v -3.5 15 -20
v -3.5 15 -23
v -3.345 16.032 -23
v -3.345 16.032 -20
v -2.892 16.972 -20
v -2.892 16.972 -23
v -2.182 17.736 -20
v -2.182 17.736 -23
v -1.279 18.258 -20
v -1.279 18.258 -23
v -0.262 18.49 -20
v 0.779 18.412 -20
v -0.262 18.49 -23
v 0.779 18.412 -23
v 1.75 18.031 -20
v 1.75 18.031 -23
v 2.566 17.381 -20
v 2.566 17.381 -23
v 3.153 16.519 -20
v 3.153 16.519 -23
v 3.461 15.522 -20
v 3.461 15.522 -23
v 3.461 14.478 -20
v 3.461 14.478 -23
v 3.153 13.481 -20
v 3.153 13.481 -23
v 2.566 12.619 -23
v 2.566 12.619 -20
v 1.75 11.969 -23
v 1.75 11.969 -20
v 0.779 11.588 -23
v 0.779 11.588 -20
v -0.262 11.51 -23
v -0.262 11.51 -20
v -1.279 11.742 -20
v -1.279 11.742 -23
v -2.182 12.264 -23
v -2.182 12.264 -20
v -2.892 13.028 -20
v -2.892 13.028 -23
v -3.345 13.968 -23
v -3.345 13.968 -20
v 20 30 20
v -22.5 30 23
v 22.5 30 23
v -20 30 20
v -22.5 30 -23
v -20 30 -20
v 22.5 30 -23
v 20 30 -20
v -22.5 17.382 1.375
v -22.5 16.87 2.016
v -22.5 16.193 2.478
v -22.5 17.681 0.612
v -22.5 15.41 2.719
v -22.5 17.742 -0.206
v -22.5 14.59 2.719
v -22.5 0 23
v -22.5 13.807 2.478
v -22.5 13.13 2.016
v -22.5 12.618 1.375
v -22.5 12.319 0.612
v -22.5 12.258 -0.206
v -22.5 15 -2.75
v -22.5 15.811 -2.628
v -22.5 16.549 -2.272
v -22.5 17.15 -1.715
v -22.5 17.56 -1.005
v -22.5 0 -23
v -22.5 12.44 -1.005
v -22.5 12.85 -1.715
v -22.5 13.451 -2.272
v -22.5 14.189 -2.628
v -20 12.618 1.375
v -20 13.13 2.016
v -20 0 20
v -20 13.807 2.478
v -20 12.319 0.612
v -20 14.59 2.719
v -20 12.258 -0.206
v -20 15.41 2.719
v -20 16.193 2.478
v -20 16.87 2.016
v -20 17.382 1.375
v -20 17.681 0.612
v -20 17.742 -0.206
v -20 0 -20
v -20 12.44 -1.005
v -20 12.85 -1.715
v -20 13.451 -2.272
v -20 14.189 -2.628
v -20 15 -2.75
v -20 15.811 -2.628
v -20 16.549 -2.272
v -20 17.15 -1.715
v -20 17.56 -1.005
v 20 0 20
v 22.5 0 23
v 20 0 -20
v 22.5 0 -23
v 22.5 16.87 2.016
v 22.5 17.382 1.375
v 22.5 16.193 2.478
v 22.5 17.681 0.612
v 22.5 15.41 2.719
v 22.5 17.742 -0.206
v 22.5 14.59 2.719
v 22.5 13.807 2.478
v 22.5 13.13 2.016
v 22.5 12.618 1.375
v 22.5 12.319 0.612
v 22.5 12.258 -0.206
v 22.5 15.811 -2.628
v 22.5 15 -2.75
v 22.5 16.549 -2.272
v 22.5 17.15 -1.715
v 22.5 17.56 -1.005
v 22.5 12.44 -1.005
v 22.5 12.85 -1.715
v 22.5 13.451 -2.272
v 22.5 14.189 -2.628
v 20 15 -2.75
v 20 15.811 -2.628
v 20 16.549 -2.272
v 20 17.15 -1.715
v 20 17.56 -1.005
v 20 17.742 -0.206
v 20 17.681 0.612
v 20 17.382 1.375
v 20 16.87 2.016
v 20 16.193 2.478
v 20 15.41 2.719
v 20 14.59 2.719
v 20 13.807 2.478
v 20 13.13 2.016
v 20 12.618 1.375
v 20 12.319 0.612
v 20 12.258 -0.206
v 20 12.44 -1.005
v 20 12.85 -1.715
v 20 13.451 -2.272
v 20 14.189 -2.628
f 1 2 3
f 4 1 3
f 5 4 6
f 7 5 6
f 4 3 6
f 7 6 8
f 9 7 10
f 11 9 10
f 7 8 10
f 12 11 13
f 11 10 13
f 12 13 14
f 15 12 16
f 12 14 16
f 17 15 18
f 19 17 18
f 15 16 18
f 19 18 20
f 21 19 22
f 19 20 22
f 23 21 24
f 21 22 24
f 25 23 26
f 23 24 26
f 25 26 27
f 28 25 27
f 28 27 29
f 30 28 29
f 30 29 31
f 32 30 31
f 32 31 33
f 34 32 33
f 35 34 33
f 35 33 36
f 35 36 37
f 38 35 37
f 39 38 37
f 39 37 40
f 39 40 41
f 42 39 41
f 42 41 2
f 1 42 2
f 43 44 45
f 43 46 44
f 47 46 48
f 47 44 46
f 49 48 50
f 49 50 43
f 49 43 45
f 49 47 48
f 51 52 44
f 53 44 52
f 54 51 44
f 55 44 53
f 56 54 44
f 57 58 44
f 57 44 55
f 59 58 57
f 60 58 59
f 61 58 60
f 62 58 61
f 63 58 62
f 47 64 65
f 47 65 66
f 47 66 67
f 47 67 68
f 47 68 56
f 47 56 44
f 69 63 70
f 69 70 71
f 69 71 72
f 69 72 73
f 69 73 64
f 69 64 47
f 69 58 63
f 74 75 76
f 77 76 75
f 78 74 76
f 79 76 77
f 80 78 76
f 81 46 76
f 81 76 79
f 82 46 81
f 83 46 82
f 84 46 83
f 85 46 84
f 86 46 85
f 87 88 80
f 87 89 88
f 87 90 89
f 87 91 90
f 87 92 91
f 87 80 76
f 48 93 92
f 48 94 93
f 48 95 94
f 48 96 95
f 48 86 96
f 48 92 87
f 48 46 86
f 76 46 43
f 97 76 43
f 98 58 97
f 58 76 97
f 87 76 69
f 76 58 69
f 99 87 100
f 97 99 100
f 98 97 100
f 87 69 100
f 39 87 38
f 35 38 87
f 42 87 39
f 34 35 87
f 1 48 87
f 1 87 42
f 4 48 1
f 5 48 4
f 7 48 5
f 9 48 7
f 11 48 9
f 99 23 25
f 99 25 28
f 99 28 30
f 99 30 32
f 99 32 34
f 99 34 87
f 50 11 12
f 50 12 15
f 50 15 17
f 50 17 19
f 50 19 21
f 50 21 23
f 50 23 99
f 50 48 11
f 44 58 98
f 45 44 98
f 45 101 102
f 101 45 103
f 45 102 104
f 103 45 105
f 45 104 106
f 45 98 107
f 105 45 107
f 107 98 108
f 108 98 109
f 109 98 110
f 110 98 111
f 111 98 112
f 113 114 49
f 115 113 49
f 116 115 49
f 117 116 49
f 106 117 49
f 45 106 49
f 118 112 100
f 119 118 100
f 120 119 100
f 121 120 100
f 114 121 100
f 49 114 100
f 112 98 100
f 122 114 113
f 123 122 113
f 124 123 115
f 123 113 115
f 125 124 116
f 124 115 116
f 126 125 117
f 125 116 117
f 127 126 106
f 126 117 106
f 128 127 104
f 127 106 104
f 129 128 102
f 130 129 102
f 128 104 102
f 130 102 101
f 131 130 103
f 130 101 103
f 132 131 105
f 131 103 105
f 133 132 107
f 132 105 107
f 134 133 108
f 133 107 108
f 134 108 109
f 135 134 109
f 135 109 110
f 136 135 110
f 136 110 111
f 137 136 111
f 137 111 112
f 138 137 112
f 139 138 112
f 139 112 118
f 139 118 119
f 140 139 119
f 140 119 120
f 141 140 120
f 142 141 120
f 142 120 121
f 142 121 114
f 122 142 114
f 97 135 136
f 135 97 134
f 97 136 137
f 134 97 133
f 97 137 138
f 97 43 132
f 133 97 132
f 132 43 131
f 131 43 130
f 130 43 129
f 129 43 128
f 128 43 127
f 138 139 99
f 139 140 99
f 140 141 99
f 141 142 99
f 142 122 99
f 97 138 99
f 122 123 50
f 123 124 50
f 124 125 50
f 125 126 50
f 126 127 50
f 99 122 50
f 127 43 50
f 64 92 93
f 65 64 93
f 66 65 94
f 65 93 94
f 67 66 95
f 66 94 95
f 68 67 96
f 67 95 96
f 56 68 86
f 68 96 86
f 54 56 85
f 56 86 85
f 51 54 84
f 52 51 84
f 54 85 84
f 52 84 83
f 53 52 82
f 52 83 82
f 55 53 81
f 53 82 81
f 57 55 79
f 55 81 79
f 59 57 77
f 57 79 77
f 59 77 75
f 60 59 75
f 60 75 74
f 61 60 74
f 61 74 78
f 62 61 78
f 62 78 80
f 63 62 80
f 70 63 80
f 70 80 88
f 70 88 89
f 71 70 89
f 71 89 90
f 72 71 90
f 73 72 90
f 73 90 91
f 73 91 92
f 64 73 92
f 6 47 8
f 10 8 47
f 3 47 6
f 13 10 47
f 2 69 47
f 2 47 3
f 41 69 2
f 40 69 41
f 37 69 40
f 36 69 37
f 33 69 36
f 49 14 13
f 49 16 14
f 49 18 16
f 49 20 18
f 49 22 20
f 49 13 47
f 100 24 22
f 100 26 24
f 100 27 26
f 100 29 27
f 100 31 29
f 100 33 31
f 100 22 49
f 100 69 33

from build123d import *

# Parameters (mm, degrees)
SKETCH1_W           = 45
SKETCH1_H           = 46
BOSS_EXTRUDE1_DEPTH = 30
SKETCH3_R           = 3.5
CUT_EXTRUDE2_DEPTH  = 10
SKETCH4_R           = 2.75
CUT_EXTRUDE3_DEPTH  = 59.77074102
SKETCH2_W           = 40
SKETCH2_H           = 40
CUT_EXTRUDE4_DEPTH  = 44.991476447


with BuildPart() as part:
    # Sketch1 → Boss-Extrude1 (new body)
    with BuildSketch(Plane(origin=(0, 0, 0), x_dir=(1, 0, 0), z_dir=(0, 1, 0))):
        Rectangle(SKETCH1_W, SKETCH1_H)
    extrude(amount=BOSS_EXTRUDE1_DEPTH)

    # Sketch3 → Cut-Extrude2 (cut)
    with BuildSketch(Plane(origin=(0, 0, -23), x_dir=(-1, 0, 0), z_dir=(0, 0, -1))):
        with Locations((0, 15)):
            Circle(SKETCH3_R)
    extrude(amount=-CUT_EXTRUDE2_DEPTH, mode=Mode.SUBTRACT)

    # Sketch4 → Cut-Extrude3 (cut, through all)
    with BuildSketch(Plane(origin=(22.5, 0, 0), x_dir=(0, 0, -1), z_dir=(1, 0, 0))):
        with Locations((0, 15)):
            Circle(SKETCH4_R)
    extrude(amount=-CUT_EXTRUDE3_DEPTH, mode=Mode.SUBTRACT)

    # Sketch2 → Cut-Extrude4 (cut, through all)
    with BuildSketch(Plane(origin=(0, 30, 0), x_dir=(1, 0, 0), z_dir=(0, 1, 0))):
        Rectangle(SKETCH2_W, SKETCH2_H)
    extrude(amount=-CUT_EXTRUDE4_DEPTH, mode=Mode.SUBTRACT)


solid = part.part
